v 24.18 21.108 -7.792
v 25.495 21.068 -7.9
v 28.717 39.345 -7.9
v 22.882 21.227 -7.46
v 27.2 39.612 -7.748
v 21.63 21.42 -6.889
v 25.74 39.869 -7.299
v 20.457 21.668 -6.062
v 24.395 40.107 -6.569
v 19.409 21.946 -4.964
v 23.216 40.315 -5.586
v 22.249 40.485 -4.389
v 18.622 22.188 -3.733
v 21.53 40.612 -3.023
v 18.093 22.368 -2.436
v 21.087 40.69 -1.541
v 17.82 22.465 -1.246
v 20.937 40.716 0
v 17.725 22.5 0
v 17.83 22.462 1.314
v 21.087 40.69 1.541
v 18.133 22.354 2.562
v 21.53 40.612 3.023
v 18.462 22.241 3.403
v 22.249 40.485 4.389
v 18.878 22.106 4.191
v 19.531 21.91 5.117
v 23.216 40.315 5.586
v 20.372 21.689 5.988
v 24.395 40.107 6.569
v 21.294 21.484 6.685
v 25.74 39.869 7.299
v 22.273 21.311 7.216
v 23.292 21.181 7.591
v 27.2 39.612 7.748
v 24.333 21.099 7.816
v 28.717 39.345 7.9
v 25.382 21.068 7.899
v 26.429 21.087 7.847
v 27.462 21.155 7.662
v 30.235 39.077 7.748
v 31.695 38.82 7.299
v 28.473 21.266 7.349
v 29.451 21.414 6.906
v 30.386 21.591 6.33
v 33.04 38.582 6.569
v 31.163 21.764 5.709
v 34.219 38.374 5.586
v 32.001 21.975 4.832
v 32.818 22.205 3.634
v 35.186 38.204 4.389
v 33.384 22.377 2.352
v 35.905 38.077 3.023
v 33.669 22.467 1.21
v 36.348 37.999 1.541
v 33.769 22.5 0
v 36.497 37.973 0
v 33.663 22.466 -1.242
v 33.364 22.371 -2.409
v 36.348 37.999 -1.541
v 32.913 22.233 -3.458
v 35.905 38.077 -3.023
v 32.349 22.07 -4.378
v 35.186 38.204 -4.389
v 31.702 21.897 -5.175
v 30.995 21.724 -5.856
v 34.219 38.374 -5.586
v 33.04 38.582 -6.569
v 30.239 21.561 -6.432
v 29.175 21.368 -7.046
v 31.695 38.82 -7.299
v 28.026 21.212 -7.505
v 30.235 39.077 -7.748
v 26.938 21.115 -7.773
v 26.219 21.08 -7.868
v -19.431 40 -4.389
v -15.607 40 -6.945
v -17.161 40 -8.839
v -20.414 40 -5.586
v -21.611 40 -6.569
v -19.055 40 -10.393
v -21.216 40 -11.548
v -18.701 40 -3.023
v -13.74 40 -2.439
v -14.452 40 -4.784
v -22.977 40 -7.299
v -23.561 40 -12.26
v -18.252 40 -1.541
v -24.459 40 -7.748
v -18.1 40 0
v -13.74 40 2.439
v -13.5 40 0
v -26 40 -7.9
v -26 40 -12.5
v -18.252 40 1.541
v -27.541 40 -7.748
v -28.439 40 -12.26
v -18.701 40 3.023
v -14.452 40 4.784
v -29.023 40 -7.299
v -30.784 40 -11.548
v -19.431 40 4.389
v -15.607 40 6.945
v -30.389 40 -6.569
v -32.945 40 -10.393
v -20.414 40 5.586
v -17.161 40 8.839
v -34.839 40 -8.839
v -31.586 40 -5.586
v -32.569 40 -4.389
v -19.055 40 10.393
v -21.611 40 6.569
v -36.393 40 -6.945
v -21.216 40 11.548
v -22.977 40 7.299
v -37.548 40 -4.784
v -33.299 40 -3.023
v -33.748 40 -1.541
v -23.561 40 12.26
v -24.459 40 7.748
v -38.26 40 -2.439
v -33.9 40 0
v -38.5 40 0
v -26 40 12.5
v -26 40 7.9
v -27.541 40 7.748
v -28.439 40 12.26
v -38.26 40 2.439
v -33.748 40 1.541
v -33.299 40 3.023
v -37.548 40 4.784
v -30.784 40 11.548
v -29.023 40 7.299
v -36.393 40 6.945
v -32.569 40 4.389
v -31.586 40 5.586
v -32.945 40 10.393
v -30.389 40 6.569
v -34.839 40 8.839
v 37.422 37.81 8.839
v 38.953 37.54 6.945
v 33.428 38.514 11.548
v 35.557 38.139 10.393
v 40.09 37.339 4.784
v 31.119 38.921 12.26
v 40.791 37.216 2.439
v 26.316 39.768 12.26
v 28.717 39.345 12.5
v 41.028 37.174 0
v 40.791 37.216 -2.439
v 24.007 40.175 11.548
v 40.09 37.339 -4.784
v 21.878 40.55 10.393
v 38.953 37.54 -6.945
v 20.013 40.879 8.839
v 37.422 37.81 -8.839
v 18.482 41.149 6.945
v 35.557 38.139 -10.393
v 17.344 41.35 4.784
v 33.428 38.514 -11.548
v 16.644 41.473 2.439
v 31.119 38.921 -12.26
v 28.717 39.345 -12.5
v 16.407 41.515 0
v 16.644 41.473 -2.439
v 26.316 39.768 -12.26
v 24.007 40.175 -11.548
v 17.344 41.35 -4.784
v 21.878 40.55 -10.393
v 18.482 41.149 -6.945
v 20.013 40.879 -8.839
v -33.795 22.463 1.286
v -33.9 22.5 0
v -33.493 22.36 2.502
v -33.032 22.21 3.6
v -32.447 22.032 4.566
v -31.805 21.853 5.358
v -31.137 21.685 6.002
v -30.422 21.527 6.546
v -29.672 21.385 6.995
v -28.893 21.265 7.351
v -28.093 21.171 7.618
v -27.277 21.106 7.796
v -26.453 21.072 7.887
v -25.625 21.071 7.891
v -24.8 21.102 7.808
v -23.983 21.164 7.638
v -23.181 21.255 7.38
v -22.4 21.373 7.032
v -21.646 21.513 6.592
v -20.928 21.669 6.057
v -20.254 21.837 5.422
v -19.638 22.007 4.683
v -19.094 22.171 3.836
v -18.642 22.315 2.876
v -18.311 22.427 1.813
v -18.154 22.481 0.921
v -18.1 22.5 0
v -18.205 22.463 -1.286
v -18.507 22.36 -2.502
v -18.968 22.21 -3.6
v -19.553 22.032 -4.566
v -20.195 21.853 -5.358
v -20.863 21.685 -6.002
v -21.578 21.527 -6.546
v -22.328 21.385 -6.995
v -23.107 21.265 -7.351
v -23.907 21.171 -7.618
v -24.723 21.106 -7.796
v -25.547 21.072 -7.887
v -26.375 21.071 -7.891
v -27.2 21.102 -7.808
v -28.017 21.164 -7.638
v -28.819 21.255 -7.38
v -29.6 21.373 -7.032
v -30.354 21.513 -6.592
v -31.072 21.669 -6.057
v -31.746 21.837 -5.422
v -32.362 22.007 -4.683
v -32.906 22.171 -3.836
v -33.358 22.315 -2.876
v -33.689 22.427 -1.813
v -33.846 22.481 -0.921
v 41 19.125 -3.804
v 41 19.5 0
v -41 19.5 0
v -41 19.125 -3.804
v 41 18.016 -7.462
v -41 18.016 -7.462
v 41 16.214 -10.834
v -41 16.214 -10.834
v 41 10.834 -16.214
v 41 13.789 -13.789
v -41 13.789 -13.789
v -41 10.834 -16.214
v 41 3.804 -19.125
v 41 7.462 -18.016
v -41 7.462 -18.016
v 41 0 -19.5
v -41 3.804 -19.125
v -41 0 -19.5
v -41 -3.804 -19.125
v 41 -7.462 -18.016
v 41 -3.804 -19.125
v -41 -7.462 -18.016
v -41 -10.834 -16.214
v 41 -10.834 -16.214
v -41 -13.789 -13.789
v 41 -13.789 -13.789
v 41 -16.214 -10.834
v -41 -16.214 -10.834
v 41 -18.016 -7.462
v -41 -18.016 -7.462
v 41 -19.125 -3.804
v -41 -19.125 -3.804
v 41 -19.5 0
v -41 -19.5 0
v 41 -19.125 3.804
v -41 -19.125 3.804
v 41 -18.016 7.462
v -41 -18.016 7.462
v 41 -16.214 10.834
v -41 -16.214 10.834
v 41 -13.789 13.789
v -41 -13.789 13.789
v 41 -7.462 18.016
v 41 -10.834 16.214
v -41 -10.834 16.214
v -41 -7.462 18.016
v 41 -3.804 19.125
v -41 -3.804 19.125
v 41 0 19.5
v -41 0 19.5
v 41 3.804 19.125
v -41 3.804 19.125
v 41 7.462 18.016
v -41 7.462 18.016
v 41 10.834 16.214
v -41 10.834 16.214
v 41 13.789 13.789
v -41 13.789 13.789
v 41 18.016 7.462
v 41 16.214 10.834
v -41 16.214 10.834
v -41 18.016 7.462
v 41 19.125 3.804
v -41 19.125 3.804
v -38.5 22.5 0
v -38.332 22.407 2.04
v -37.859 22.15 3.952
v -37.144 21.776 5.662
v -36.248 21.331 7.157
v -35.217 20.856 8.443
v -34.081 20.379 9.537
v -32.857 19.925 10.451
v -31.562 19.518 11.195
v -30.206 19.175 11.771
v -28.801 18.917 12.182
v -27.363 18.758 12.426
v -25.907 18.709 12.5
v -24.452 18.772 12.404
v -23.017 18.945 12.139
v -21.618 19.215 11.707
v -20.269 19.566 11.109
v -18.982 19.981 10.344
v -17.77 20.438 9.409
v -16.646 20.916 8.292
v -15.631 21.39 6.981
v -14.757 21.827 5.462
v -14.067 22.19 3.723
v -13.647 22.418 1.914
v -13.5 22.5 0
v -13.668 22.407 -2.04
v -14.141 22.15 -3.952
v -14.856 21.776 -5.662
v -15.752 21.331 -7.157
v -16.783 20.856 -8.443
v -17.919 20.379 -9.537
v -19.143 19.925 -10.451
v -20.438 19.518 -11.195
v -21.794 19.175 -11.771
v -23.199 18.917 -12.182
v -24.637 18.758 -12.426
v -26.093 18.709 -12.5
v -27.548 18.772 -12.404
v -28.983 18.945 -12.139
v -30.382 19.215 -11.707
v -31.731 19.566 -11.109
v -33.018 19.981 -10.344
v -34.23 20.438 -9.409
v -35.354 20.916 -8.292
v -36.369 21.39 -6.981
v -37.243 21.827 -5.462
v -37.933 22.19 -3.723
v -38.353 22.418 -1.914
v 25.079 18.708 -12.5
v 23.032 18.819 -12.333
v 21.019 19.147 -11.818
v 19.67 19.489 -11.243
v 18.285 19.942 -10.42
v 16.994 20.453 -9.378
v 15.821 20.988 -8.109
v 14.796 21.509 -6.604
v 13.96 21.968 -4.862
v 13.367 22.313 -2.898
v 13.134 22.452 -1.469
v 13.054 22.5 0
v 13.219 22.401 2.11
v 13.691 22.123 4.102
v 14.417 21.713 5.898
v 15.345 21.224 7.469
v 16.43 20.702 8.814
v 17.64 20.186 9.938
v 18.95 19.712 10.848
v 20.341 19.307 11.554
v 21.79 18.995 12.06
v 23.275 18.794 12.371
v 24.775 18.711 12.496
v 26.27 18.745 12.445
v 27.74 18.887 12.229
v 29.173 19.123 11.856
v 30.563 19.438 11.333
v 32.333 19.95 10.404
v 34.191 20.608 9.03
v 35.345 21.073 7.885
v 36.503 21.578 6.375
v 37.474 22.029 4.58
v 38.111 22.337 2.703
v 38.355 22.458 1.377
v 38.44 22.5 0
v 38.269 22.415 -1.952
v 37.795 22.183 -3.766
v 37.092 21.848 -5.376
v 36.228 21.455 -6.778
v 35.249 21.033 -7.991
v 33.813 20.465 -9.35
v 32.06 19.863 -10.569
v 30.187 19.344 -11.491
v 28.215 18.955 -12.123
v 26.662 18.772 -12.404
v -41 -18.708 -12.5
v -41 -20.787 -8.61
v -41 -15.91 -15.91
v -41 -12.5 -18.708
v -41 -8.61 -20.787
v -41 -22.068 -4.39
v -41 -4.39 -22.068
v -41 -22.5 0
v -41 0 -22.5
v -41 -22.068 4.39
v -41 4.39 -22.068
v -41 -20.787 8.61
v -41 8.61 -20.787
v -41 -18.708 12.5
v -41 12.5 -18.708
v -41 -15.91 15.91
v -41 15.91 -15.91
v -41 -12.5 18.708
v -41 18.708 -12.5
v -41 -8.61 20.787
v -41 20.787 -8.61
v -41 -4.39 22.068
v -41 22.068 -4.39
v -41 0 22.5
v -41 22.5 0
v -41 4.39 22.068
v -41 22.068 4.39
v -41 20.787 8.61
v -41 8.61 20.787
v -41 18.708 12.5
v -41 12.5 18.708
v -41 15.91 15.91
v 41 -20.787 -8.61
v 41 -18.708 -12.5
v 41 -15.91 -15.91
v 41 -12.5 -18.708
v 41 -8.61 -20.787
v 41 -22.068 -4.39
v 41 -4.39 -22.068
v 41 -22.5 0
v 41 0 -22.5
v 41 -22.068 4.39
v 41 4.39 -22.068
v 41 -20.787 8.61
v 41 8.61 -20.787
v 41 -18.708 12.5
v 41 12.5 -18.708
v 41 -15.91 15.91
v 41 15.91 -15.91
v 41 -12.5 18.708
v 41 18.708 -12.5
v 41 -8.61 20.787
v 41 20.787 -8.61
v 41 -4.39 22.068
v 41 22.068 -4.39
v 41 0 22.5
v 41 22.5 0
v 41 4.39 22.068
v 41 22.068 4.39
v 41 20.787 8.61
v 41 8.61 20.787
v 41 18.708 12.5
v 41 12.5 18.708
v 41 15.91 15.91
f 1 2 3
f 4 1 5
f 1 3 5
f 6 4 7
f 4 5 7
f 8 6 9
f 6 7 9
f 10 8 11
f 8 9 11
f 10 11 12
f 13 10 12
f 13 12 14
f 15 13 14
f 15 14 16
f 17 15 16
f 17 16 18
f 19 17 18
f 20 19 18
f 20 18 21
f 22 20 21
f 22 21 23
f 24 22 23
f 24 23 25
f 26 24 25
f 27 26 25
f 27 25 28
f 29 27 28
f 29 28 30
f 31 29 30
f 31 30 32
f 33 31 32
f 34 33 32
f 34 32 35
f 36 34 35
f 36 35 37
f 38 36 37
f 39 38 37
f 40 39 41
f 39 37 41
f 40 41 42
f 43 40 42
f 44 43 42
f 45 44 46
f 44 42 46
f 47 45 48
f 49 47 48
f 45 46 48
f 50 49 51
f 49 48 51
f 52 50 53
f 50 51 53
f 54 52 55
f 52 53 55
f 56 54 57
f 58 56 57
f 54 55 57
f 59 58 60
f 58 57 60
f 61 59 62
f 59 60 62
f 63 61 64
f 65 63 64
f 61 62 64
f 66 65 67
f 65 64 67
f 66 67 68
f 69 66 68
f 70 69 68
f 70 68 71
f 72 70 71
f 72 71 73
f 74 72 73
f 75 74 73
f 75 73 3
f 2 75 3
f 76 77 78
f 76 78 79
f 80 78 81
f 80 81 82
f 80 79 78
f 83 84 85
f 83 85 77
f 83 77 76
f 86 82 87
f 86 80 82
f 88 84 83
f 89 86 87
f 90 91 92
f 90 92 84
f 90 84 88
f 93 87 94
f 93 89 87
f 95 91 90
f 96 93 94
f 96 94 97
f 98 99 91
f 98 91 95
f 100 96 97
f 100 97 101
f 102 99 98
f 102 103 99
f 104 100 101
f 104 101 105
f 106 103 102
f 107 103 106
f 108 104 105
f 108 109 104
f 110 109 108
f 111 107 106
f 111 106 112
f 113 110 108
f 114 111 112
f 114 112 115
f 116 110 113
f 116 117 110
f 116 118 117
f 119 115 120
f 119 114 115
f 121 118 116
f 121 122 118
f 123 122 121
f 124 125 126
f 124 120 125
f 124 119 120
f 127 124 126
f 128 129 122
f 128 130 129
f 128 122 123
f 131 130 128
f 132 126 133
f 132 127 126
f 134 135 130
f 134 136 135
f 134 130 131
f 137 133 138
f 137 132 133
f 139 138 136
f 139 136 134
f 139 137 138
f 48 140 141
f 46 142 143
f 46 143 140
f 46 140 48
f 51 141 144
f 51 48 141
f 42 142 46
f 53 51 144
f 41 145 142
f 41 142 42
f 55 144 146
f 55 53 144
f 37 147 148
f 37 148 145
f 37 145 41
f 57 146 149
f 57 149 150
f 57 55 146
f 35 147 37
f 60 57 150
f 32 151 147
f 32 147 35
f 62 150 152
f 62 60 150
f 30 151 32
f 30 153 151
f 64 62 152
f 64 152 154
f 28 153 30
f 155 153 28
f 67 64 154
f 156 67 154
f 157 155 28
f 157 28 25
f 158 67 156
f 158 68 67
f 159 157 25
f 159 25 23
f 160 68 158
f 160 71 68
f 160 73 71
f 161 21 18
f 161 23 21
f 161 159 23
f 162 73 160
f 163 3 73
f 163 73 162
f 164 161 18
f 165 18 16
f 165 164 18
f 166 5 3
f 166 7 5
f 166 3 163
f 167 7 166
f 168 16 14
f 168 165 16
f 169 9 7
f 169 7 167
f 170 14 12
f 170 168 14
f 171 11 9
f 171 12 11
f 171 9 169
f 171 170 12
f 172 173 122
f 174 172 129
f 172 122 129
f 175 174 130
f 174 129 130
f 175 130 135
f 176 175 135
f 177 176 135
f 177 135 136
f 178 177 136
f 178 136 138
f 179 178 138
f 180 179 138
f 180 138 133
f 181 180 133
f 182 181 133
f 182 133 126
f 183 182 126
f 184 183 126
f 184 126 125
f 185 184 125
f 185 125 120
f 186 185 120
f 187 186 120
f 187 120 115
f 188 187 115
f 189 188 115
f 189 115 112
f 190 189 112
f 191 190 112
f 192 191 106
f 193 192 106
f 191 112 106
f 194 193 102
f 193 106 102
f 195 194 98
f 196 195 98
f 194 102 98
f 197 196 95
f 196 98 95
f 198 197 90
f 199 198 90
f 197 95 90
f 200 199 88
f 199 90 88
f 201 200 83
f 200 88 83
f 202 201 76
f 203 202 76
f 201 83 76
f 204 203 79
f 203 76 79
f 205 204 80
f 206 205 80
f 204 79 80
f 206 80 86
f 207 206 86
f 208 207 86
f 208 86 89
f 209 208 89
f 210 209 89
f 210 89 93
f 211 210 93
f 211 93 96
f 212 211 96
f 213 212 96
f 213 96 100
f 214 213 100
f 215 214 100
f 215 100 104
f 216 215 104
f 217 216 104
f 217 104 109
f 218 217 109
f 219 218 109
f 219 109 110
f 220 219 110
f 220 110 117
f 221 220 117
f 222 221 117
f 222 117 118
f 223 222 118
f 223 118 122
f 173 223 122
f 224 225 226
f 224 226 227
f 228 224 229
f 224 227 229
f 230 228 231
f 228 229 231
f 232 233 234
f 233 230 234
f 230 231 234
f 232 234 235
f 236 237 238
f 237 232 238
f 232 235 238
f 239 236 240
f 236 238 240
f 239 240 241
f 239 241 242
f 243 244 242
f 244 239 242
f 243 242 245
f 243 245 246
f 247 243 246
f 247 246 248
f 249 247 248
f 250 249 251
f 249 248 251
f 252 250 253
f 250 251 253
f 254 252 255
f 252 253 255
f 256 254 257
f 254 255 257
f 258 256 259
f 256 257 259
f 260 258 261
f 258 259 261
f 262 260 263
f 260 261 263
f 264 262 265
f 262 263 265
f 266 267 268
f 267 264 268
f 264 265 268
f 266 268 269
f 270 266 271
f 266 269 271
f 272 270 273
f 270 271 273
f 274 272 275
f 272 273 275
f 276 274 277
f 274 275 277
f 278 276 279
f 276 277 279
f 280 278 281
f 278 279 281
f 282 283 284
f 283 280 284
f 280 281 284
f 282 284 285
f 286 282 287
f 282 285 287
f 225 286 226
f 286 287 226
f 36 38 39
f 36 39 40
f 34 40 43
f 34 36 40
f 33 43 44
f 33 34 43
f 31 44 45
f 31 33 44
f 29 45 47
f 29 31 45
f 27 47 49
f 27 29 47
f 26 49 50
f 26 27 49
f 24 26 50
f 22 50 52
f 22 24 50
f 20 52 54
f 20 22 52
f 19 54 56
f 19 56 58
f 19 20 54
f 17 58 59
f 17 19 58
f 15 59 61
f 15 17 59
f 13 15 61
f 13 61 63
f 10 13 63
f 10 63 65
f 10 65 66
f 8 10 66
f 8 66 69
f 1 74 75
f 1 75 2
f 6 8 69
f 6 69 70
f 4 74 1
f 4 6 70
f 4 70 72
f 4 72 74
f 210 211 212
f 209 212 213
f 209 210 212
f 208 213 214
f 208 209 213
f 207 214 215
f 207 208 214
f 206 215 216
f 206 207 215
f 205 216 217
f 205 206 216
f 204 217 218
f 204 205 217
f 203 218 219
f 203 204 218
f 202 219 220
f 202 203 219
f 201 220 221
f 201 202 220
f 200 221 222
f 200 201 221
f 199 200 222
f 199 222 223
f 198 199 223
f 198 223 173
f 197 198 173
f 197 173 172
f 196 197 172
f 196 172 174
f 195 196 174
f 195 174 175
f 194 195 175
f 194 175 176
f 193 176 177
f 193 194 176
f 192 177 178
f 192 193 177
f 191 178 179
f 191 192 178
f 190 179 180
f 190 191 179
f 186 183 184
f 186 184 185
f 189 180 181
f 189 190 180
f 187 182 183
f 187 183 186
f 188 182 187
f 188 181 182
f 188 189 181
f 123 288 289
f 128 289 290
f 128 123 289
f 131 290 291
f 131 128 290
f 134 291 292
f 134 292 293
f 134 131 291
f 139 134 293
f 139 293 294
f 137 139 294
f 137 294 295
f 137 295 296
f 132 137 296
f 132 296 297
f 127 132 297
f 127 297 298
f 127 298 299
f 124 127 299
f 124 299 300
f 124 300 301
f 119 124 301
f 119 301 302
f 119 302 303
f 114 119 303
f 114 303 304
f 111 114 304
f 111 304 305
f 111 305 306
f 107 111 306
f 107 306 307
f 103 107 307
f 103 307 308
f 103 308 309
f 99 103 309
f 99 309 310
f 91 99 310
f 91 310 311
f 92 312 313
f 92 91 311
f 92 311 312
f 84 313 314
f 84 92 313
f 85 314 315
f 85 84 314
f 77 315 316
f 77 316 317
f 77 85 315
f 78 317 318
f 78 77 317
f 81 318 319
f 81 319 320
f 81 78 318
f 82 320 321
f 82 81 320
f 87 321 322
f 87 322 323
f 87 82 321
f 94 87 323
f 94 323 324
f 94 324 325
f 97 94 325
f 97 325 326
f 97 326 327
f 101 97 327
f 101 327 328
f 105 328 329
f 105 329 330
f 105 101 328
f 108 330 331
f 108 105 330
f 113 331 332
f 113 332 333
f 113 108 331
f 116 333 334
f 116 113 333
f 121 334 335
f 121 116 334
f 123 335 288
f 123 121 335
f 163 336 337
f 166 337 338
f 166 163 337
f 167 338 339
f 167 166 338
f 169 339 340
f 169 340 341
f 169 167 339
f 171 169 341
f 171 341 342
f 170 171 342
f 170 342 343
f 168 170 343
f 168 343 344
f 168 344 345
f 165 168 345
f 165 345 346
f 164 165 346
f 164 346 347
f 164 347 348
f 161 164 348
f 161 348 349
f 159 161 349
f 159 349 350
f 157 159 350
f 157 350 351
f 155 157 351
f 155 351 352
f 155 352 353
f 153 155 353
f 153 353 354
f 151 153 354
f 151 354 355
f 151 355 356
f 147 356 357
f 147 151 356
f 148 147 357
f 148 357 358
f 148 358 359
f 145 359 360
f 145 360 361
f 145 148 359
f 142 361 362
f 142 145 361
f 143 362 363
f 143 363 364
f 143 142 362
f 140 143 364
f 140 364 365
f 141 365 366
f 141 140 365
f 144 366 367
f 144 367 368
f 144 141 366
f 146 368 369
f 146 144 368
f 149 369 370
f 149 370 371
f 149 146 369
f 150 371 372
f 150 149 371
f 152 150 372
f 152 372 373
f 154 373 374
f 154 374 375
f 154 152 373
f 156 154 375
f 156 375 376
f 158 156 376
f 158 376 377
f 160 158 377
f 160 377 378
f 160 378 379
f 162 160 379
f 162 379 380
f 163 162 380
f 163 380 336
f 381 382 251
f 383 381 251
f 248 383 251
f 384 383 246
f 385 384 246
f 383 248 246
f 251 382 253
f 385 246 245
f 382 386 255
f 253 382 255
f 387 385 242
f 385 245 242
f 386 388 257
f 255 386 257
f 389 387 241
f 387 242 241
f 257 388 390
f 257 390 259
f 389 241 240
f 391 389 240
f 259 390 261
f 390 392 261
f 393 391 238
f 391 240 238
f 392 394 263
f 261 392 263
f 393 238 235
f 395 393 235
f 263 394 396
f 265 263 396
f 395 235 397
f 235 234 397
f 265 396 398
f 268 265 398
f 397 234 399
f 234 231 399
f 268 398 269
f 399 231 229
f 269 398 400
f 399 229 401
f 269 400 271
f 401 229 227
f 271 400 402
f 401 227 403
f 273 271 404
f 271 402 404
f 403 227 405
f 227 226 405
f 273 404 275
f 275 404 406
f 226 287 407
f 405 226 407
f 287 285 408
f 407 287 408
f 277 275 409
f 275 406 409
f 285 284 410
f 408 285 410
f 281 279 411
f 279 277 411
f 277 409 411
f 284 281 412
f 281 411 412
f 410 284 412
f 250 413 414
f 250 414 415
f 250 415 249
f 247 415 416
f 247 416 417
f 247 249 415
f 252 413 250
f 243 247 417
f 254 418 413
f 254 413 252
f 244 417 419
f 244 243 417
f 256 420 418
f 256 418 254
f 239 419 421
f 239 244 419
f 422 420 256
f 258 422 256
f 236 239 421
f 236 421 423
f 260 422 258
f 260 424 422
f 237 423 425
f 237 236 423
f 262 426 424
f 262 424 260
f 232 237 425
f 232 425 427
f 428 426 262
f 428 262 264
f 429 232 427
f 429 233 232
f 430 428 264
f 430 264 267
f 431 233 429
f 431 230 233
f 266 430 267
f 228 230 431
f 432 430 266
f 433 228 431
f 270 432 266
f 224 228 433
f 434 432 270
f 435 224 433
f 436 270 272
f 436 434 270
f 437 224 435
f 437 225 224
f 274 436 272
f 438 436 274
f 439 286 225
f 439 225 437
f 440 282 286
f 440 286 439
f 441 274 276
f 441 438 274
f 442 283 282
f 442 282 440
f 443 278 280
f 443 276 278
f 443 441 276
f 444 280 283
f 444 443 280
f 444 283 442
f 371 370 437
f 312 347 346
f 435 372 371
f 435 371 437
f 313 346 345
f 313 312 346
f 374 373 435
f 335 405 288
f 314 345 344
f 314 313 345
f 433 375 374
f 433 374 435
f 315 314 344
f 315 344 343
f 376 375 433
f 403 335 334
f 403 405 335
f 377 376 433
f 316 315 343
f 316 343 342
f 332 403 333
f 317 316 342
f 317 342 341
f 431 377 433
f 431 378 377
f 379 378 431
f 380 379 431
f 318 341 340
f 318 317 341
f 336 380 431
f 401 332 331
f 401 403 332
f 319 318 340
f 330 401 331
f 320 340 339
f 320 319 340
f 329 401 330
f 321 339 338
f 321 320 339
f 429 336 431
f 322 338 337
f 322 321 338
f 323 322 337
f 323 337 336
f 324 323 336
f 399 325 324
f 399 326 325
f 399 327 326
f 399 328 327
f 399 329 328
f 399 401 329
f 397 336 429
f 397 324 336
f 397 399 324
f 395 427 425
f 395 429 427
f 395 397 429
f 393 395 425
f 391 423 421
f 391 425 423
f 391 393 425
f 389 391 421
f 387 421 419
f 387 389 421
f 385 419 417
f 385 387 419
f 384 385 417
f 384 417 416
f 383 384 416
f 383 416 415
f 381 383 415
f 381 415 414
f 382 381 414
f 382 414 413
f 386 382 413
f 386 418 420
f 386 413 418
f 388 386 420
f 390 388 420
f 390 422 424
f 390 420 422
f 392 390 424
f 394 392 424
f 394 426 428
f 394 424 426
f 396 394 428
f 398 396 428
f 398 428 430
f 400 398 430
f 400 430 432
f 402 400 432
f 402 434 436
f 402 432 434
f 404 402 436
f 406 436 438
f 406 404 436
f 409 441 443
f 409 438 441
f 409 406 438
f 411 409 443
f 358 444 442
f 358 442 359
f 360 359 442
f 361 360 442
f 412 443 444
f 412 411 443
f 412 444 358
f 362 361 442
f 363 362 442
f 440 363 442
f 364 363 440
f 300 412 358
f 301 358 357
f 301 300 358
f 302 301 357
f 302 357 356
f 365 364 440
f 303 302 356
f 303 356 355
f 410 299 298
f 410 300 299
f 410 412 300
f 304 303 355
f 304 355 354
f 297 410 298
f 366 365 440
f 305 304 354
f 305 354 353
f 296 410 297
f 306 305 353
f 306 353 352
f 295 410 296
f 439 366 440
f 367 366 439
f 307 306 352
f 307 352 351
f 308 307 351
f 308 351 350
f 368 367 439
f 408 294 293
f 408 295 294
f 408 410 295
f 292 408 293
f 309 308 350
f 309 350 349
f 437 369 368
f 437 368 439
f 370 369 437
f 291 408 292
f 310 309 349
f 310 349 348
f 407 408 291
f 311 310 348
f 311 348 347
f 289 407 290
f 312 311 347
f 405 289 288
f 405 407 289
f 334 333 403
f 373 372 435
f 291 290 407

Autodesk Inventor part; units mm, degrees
ref_plane "YZ Plane" through (0, 0, 0) normal (1, 0, 0) x (0, 1, 0)
sketch "Sketch1" plane through (0, 0, 0) normal (1, 0, 0) x (0, 1, 0)
  circle A0 centre (0, 0) radius 19.5
  circle A1 centre (0, 0) radius 22.5
  dimension "d0" = 39
  dimension "d1" = 45
extrude "Extrusion1" add sketch "Sketch1" along normal mid plane 82
ref_plane "Work Plane1" through (0, 40, 0) normal (0, 1, 0) x (-1, 0, 0)
sketch "Sketch2" plane through (0, 40, 0) normal (0, 1, 0) x (-1, 0, 0)
  circle A0 centre (26, 0) radius 12.5
  circle A1 centre (26, 0) radius 7.9
  line L0 (41, -22.5) -> (41, 22.5) projected
  point P0 (0, 0)
  dimension "d6" = 25
  dimension "d7" = 15.8
  dimension "d19" = 15
extrude "Extrusion2" add sketch "Sketch2" against normal up to surface
sketch "Sketch3" plane through (0, 40, 0) normal (0, 1, 0) x (-1, 0, 0)
  line L0 (41, 22.5) -> (-41, 22.5) projected
  line L1 (-25, 22.5) -> (-25, -21.8926)
  line L2 (41, 22.5) -> (-41, 22.5) projected
  point P0 (0, 0)
  dimension "d16" = 25
ref_plane "Work Plane3" through (25, 40, 22.5) normal (0.1736, 0.9848, 0) x (0, 0, -1)
sketch "Sketch4" plane through (25, 40, 22.5) normal (0.1736, 0.9848, 0) x (0, 0, -1)
  ellipse E0 centre (22.5, 50.2252) end of major axis (14.6, 50.2252) minor radius 7.78 projected
  circle A0 centre (22.5, -3.7748) radius 7.9
  circle A1 centre (22.5, -3.7748) radius 12.5
  ellipse E1 centre (22.5, 50.2252) end of major axis (10, 50.2252) minor radius 12.3101 projected
  point P0 (22.5, 17.6743)
  dimension "d11" = 54
  dimension "d12" = 15.8
  dimension "d13" = 25
extrude "Extrusion3" add sketch "Sketch4" against normal up to surface contours A1
properties part number "JuntaRodilla" material "PLA"
